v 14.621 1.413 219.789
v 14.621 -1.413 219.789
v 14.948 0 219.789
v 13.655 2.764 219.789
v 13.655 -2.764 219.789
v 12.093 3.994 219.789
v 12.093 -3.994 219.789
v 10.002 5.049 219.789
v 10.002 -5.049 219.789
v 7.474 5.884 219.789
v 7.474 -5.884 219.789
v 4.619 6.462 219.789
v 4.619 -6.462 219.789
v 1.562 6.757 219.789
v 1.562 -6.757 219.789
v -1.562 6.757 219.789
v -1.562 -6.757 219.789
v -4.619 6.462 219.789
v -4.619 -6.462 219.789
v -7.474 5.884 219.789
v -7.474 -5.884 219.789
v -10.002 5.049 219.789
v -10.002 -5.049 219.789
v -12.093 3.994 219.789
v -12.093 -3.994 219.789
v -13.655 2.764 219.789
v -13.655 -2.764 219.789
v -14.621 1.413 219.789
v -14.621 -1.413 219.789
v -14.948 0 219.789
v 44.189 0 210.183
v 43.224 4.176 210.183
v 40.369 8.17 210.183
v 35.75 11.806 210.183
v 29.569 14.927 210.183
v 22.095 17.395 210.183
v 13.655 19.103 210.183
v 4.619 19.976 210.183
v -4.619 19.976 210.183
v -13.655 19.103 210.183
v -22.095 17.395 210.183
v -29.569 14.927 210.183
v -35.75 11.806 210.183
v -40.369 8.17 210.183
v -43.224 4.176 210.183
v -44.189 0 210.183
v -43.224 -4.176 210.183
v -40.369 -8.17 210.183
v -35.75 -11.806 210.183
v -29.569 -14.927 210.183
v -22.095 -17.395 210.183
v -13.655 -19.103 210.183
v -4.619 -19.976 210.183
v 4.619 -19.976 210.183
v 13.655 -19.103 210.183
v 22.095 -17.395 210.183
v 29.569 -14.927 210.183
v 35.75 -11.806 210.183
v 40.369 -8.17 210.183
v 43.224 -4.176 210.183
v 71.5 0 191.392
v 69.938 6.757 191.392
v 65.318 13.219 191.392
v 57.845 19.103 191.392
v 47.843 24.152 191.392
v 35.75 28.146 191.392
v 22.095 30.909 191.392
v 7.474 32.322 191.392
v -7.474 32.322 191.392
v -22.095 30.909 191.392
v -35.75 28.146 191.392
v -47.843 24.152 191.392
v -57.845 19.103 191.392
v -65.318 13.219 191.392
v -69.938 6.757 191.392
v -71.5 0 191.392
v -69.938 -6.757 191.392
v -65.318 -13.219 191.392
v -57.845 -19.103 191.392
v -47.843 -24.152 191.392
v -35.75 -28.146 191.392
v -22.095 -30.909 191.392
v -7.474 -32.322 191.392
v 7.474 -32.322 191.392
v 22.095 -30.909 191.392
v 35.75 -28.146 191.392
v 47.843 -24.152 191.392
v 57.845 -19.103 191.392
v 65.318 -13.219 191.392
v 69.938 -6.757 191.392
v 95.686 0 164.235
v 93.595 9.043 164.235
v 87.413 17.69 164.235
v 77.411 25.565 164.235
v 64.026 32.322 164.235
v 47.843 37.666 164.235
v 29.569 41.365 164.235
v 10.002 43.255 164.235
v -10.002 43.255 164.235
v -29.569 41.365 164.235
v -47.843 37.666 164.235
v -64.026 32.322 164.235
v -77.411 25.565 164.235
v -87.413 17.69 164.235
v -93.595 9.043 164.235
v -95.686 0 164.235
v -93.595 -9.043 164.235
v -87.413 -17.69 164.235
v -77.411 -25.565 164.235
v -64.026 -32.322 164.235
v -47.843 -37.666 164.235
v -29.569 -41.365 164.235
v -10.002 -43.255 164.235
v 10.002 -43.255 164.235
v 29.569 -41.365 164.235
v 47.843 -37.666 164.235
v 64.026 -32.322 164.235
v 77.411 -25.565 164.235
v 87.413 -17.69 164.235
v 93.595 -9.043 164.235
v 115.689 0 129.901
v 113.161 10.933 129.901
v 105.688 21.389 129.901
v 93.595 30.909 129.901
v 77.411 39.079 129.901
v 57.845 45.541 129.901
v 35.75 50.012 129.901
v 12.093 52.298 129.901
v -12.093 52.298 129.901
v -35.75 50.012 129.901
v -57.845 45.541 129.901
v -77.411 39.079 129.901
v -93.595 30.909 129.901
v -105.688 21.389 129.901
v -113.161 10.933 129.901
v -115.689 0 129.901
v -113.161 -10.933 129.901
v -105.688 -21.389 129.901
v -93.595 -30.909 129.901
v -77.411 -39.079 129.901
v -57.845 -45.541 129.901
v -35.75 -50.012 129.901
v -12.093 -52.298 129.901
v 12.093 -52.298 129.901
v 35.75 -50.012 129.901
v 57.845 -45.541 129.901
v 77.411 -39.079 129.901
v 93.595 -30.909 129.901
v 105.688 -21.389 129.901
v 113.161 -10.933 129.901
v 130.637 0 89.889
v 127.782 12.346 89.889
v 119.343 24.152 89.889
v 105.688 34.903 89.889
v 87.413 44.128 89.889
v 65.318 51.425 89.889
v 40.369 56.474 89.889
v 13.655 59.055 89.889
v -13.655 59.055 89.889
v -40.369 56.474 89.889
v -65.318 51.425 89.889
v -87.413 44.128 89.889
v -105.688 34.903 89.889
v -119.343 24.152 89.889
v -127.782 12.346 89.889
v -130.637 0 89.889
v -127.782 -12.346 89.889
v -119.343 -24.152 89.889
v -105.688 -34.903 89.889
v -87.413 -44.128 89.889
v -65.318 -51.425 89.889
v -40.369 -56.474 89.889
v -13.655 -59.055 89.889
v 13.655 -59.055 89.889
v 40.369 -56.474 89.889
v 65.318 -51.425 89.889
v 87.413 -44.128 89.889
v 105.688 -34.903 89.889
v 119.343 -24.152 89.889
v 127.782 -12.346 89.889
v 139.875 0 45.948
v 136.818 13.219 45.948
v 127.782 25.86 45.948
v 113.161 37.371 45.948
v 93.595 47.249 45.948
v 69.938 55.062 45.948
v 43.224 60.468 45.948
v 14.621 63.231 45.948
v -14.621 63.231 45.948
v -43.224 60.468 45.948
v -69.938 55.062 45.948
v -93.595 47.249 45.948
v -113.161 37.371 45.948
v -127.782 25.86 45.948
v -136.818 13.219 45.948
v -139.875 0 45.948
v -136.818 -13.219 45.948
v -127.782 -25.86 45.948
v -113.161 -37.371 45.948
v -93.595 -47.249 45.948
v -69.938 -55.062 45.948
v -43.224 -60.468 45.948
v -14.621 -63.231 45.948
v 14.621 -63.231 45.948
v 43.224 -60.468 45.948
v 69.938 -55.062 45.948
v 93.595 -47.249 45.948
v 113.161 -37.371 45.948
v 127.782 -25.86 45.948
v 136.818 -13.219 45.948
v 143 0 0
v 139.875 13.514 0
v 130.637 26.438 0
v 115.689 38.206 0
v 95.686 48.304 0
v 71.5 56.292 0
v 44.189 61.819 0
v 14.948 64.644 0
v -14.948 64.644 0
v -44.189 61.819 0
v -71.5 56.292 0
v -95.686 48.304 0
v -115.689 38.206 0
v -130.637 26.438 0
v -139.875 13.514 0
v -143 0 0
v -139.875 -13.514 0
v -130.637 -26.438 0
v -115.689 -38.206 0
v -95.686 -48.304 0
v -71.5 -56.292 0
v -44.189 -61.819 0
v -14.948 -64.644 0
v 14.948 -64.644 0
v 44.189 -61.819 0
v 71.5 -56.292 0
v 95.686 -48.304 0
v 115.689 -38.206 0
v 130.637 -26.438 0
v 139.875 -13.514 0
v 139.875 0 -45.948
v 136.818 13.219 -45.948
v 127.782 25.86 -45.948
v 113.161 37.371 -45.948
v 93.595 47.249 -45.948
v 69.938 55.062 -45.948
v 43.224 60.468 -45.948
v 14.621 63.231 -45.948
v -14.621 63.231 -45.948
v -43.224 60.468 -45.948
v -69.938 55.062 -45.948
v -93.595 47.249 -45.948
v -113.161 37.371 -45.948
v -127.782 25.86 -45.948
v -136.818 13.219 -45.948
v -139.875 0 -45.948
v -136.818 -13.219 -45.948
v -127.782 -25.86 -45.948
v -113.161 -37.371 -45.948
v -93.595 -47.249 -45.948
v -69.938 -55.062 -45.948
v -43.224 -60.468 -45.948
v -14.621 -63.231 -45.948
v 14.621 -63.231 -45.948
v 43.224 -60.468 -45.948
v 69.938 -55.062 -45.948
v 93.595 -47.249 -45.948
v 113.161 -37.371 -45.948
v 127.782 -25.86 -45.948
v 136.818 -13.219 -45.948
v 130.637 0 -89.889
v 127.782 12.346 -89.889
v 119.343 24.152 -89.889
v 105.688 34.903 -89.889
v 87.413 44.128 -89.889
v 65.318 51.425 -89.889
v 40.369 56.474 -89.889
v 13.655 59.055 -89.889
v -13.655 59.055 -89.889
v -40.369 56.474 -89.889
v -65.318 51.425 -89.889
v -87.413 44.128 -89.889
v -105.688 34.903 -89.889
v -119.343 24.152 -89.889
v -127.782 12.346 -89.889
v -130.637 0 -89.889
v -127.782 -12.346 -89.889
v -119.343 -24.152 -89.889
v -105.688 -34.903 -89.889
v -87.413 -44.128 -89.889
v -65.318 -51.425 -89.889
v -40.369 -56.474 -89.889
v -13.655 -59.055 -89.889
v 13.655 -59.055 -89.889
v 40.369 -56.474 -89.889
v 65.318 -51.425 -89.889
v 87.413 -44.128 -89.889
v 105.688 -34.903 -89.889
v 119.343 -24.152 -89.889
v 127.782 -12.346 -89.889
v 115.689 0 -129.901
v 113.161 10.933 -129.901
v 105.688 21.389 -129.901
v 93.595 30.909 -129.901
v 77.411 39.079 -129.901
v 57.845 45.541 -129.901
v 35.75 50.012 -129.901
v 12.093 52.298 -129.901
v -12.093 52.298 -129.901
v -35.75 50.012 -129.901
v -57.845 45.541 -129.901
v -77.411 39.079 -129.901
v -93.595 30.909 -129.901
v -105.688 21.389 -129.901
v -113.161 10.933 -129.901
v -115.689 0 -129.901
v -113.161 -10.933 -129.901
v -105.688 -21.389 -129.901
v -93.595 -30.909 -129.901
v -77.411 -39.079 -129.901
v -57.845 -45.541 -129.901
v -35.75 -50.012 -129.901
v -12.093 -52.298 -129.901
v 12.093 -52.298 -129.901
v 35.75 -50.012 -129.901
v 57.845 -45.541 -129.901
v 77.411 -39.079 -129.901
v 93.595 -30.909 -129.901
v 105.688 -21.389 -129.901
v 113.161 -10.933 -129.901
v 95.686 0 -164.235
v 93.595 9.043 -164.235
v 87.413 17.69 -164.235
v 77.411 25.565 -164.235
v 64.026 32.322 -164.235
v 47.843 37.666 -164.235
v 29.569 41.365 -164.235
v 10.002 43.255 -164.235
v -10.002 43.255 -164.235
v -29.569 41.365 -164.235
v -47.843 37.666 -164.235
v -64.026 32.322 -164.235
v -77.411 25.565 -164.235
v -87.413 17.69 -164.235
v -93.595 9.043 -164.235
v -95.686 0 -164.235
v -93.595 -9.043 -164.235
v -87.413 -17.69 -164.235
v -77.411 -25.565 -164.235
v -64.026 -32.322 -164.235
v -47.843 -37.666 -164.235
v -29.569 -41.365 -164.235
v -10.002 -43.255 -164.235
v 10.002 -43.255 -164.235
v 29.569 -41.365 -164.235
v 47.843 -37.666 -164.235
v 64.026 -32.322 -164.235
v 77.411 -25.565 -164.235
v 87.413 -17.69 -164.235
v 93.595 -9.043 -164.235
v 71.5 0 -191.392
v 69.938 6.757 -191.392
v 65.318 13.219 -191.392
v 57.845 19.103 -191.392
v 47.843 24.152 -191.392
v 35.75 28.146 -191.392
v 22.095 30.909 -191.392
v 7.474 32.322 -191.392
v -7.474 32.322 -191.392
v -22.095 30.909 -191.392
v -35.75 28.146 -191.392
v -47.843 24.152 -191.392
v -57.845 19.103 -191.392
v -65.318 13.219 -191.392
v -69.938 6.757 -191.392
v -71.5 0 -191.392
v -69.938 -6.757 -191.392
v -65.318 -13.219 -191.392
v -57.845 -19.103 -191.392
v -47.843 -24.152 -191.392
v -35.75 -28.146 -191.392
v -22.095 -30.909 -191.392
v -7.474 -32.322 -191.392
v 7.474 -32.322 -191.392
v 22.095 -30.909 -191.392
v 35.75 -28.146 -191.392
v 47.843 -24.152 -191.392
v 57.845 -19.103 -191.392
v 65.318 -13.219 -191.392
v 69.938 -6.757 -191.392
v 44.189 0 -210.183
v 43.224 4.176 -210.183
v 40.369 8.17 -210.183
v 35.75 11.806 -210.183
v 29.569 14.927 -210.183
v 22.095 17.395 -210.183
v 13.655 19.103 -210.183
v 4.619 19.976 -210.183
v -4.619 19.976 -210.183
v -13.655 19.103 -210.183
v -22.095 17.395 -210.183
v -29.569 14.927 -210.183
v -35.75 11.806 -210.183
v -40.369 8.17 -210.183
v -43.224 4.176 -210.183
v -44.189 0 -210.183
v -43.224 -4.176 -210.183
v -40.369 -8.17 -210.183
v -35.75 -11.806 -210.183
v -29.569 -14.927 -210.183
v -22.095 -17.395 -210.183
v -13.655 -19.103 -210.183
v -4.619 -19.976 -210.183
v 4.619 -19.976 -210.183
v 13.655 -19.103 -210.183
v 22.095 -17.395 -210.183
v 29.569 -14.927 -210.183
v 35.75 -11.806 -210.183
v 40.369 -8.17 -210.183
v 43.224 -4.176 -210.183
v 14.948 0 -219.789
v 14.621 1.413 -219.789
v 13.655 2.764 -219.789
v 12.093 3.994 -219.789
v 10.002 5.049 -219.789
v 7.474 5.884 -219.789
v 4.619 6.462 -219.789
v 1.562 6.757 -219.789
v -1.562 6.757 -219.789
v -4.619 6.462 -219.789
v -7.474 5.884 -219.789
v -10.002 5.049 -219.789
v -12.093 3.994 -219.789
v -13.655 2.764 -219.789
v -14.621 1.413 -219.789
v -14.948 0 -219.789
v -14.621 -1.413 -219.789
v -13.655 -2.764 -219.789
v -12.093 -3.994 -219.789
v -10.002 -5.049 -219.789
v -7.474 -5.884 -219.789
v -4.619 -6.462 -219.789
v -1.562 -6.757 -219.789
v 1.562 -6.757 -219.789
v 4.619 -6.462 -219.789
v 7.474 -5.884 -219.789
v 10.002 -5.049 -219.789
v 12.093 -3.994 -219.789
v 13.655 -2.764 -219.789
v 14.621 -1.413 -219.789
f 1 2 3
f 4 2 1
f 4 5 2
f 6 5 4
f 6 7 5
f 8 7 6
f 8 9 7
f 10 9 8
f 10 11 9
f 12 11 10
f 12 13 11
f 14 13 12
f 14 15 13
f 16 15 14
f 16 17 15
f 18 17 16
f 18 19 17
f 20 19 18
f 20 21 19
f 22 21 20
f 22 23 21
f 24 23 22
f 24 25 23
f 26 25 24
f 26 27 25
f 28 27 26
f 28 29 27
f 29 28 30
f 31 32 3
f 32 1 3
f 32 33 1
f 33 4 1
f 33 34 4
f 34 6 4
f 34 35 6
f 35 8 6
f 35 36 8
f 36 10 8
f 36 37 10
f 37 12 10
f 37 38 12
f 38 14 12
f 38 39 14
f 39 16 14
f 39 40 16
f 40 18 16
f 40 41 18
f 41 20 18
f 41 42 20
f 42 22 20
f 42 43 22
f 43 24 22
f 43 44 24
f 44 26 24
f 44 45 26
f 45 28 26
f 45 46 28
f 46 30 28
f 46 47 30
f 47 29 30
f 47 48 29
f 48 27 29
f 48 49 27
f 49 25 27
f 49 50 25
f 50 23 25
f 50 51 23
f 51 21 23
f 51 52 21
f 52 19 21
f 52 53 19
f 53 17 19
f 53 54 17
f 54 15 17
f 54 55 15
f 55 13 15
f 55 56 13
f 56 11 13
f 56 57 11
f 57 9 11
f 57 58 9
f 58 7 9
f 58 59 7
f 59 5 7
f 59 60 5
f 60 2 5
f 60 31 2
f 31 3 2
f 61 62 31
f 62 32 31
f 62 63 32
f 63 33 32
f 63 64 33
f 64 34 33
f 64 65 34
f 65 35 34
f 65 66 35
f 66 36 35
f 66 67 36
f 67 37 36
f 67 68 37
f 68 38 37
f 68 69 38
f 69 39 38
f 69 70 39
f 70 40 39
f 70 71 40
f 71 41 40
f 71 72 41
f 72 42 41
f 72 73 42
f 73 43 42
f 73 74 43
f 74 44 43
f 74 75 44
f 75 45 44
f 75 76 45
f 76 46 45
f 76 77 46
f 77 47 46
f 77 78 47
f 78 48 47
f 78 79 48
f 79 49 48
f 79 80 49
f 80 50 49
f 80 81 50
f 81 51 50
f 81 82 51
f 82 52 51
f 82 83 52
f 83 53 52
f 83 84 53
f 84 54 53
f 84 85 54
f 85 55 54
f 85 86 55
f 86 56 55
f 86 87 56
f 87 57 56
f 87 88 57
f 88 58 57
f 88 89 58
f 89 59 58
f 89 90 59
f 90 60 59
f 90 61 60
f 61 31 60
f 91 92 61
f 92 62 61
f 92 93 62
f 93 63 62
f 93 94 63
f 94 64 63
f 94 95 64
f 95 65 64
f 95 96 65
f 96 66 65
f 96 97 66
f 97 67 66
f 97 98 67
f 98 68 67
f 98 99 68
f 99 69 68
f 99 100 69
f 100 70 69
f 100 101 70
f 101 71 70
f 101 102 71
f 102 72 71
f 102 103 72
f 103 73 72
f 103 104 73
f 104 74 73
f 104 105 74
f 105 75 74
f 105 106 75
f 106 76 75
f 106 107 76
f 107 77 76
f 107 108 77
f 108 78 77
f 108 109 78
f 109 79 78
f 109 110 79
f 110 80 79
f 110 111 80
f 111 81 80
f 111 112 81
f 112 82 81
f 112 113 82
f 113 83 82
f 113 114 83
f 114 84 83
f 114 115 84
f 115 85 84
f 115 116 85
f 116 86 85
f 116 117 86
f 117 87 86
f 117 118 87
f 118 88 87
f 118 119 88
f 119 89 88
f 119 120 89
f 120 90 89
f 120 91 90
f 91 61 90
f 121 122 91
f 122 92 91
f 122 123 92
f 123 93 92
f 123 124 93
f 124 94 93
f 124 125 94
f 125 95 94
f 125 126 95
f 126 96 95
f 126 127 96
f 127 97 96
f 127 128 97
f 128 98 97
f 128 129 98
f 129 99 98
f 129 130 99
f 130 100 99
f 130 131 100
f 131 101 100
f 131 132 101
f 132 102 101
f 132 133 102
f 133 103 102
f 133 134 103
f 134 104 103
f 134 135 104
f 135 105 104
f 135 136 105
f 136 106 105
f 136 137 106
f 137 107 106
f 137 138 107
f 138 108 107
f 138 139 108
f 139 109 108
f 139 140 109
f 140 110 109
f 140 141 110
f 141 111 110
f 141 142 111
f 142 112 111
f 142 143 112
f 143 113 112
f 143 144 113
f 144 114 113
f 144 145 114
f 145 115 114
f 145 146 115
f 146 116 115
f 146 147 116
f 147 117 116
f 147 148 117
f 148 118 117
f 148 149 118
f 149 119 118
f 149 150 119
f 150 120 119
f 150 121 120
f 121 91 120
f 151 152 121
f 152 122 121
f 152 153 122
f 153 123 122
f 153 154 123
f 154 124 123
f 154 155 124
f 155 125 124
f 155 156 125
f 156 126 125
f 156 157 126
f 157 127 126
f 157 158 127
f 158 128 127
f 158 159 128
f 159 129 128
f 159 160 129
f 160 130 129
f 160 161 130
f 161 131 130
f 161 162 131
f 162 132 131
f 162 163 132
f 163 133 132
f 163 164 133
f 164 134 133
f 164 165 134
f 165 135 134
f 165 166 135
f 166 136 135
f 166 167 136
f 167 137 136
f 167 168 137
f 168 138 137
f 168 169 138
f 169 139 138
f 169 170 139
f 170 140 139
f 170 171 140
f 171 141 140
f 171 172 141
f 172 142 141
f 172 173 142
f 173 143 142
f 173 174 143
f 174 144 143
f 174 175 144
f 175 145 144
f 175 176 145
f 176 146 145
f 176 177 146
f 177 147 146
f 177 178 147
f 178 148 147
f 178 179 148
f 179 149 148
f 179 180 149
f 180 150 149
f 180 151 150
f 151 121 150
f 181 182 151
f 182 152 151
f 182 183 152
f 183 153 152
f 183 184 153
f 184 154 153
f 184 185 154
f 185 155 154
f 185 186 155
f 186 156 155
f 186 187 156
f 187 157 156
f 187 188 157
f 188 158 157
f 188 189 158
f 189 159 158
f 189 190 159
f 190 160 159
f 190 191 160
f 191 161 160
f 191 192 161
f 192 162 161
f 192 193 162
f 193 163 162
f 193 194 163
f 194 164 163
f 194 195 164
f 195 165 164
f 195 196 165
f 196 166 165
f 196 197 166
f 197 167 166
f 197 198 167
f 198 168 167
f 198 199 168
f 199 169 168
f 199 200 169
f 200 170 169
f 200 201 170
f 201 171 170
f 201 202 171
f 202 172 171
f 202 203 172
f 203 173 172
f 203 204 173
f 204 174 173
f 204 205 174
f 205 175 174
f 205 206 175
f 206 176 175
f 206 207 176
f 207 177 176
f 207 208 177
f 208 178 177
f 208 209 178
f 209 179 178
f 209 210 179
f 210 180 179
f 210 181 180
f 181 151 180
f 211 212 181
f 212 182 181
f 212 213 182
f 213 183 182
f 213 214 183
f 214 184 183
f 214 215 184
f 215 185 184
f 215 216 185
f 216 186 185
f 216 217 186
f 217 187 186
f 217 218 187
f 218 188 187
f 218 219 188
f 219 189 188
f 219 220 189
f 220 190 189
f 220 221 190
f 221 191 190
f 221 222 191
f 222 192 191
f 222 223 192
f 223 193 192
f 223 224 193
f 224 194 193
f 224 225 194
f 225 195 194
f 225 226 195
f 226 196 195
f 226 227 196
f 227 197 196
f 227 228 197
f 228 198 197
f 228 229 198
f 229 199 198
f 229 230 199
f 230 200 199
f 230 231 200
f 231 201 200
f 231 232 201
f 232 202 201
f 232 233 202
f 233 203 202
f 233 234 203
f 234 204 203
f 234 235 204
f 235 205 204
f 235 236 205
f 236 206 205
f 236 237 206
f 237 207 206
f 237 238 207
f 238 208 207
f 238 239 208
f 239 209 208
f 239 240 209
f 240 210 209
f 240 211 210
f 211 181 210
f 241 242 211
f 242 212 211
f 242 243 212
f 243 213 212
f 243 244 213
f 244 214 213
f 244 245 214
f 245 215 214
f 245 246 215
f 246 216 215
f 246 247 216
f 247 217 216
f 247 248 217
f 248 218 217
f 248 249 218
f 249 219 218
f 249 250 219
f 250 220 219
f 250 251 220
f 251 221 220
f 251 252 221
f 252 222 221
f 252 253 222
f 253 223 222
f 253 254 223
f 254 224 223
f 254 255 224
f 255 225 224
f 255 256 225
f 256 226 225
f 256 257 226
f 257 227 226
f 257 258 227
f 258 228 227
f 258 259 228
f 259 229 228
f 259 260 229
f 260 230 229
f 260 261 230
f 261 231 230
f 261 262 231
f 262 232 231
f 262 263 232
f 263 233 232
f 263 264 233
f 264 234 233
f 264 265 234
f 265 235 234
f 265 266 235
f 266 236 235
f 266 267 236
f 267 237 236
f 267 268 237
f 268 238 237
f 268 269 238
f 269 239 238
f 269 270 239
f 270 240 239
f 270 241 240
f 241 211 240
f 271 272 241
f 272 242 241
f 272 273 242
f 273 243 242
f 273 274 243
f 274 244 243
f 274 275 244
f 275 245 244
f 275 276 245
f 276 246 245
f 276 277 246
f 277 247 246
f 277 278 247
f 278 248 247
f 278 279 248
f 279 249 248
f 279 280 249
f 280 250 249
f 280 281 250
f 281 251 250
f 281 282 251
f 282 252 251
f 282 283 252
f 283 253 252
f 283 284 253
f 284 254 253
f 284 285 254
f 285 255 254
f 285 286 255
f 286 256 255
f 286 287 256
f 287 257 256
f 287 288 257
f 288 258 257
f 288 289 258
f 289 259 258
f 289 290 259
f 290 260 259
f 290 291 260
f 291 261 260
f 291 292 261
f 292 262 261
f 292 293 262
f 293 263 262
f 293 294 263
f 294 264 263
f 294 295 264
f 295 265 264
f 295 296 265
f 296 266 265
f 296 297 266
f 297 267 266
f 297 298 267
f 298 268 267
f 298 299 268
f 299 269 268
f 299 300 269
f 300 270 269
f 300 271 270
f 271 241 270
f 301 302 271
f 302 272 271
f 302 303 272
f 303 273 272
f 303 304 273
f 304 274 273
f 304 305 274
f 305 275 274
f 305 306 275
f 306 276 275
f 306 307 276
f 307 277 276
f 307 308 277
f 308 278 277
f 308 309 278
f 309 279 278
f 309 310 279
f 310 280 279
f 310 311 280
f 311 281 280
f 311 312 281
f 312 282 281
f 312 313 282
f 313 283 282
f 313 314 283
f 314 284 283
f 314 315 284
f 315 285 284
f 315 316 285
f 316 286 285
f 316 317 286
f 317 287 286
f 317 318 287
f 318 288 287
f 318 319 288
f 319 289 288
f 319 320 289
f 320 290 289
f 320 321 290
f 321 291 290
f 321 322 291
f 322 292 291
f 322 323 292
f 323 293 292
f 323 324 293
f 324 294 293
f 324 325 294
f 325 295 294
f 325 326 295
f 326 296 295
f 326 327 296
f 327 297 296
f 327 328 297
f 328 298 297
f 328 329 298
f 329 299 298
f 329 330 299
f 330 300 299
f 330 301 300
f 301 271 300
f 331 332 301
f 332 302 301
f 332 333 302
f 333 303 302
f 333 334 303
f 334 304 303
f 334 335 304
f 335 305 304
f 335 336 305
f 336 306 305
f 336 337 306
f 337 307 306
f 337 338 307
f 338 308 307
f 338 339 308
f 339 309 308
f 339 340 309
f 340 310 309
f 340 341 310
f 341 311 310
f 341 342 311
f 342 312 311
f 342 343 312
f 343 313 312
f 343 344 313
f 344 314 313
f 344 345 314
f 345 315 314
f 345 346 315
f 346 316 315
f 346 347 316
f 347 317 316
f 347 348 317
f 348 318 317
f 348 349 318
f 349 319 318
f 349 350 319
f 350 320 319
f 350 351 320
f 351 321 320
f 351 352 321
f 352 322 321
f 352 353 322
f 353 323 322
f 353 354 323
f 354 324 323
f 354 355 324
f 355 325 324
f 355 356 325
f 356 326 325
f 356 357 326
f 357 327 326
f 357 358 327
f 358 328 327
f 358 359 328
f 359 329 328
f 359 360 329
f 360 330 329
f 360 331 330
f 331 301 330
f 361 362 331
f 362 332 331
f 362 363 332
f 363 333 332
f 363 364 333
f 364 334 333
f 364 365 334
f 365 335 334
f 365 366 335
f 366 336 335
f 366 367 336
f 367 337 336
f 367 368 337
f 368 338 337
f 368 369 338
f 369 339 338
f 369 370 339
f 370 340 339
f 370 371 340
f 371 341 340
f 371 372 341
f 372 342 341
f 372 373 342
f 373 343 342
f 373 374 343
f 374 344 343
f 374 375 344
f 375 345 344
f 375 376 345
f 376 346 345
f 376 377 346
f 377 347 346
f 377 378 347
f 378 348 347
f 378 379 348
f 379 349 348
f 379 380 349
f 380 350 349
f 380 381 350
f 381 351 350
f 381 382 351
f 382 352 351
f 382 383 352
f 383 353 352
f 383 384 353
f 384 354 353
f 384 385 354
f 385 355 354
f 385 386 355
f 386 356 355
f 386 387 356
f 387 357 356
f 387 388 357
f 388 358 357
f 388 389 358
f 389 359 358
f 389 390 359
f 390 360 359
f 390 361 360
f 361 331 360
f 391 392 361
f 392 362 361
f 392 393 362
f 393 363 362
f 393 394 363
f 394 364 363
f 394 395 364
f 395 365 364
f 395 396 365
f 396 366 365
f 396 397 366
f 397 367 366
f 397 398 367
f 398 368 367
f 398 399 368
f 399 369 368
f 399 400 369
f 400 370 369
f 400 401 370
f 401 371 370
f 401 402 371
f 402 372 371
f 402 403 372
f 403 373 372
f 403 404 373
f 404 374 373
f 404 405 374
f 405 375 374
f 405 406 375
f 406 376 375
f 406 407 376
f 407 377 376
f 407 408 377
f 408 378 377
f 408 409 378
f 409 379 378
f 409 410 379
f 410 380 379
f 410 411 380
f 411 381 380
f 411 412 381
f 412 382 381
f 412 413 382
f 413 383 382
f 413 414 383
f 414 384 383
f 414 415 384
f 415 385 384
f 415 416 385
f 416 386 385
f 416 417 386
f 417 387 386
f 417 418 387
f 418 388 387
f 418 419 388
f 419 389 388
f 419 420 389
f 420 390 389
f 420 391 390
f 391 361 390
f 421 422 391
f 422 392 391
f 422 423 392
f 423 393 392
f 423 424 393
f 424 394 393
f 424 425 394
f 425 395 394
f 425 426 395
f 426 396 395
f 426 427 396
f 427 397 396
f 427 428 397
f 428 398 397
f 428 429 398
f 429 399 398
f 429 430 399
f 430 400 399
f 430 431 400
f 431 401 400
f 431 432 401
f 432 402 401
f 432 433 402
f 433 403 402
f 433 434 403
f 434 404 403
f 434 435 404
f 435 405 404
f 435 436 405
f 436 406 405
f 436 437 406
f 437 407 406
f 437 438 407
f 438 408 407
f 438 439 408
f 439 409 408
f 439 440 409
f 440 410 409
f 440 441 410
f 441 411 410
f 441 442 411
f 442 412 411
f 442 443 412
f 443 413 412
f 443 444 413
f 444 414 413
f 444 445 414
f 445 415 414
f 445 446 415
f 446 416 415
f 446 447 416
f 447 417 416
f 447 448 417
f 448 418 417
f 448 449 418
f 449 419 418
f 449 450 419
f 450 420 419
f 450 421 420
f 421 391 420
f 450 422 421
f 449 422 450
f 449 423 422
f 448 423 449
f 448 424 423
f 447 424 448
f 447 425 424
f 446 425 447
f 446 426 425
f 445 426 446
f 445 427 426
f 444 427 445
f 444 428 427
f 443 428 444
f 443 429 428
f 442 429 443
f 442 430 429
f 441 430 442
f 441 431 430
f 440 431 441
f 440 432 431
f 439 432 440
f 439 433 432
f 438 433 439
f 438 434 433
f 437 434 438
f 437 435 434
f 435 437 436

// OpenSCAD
// Generated by SolidPython 1.0.1 on 2020-07-29 00:46:49


scale(v = [11, 5, 17]) {
	sphere(r = 13);
}
/***********************************************
*********      SolidPython code:      **********
************************************************
 
# import packages: SolidPython
from solid import *
from solid.utils import *
from itertools import chain, combinations, permutations


class Resize:

    def __init__(self, scad_file):
        self.scad_file = scad_file
        #self.scad_file = import_scad(scad_file)
        # cone/cylinder param:
        self.r1 = 0
        self.r2 = 0
        self.h = 0
        # rectangular prism param:
        self.w = 0
        self.l = 0
        # ellipse param:
        self.r = 0

    # import OpenScad code (file name corresponds to shape)


    # classify shape + parameters
    def assign(self, param1, param2, param3):
        if self.scad_file == 'cone.scad':
            self.r1 = param1
            self.r2 = param2
            self.h = param3
        elif self.scad_file == 'cylinder.scad':
            self.r1 = param1
            self.r2 = param2
            self.h = param3
        elif self.scad_file == 'rectangularPrism.scad':
            self.h = param1
            self.l = param2
            self.w = param3
        else:
            self.r = param1
            self.h = param2

    # resize parameters
    def iterate(self):
        x = range(3, 20, 2)
        i = 1
        if self.scad_file == 'cone.scad':
            tempList = list(permutations(x, 2))
            for temp in tempList:
                param1 = temp[0]
                param2 = temp[1]
                filepath = 'produced_scad_files/' + 'cone' + str(param1) + '_' + str(param2) + '_' + '.scad'
                scad_render_to_file(cylinder(h=param1, r1=param2, r2=0), filepath)

        elif self.scad_file == 'cylinder.scad':
            tempList = list(permutations(x, 3))
            for temp in tempList:
                param1 = temp[0]
                param2 = temp[1]
                filepath = 'produced_scad_files/' + 'cylinder' + str(param1) + '_' + str(param2) + '_' + '.scad'
                scad_render_to_file(cylinder(h=param1, r1=param2, r2=param2), filepath)

        elif self.scad_file == 'rectangularPrism.scad':
            tempList = list(permutations(x, 3))
            for temp in tempList:
                param1 = temp[0]
                param2 = temp[1]
                param3 = temp[2]
                filepath = 'produced_scad_files/' + 'rectangularPrism' + str(param1) + '_' + str(param2) + '_' + str(
                    param3) + '.scad'
                scad_render_to_file(cube(size=(param1, param2, param3)), filepath)

        elif self.scad_file == 'ellipse.scad':
            tempList = list(permutations(x, 4))
            for temp in tempList:
                param1 = temp[0]
                param2 = temp[1]
                param3 = temp[2]
                param4 = temp[3]
                filepath = 'produced_scad_files/' + 'ellipse' + str(param1) + '_' + str(param2) + '_' + str(param3) + '_' + str(param4) + '.scad'
                scad_render_to_file(scale([param1, param2, param3])(sphere(r=param4)), filepath)

    def render_to_scadfile(self):
        scad_render_to_file(scad, 'example.scad') 
 
************************************************/
